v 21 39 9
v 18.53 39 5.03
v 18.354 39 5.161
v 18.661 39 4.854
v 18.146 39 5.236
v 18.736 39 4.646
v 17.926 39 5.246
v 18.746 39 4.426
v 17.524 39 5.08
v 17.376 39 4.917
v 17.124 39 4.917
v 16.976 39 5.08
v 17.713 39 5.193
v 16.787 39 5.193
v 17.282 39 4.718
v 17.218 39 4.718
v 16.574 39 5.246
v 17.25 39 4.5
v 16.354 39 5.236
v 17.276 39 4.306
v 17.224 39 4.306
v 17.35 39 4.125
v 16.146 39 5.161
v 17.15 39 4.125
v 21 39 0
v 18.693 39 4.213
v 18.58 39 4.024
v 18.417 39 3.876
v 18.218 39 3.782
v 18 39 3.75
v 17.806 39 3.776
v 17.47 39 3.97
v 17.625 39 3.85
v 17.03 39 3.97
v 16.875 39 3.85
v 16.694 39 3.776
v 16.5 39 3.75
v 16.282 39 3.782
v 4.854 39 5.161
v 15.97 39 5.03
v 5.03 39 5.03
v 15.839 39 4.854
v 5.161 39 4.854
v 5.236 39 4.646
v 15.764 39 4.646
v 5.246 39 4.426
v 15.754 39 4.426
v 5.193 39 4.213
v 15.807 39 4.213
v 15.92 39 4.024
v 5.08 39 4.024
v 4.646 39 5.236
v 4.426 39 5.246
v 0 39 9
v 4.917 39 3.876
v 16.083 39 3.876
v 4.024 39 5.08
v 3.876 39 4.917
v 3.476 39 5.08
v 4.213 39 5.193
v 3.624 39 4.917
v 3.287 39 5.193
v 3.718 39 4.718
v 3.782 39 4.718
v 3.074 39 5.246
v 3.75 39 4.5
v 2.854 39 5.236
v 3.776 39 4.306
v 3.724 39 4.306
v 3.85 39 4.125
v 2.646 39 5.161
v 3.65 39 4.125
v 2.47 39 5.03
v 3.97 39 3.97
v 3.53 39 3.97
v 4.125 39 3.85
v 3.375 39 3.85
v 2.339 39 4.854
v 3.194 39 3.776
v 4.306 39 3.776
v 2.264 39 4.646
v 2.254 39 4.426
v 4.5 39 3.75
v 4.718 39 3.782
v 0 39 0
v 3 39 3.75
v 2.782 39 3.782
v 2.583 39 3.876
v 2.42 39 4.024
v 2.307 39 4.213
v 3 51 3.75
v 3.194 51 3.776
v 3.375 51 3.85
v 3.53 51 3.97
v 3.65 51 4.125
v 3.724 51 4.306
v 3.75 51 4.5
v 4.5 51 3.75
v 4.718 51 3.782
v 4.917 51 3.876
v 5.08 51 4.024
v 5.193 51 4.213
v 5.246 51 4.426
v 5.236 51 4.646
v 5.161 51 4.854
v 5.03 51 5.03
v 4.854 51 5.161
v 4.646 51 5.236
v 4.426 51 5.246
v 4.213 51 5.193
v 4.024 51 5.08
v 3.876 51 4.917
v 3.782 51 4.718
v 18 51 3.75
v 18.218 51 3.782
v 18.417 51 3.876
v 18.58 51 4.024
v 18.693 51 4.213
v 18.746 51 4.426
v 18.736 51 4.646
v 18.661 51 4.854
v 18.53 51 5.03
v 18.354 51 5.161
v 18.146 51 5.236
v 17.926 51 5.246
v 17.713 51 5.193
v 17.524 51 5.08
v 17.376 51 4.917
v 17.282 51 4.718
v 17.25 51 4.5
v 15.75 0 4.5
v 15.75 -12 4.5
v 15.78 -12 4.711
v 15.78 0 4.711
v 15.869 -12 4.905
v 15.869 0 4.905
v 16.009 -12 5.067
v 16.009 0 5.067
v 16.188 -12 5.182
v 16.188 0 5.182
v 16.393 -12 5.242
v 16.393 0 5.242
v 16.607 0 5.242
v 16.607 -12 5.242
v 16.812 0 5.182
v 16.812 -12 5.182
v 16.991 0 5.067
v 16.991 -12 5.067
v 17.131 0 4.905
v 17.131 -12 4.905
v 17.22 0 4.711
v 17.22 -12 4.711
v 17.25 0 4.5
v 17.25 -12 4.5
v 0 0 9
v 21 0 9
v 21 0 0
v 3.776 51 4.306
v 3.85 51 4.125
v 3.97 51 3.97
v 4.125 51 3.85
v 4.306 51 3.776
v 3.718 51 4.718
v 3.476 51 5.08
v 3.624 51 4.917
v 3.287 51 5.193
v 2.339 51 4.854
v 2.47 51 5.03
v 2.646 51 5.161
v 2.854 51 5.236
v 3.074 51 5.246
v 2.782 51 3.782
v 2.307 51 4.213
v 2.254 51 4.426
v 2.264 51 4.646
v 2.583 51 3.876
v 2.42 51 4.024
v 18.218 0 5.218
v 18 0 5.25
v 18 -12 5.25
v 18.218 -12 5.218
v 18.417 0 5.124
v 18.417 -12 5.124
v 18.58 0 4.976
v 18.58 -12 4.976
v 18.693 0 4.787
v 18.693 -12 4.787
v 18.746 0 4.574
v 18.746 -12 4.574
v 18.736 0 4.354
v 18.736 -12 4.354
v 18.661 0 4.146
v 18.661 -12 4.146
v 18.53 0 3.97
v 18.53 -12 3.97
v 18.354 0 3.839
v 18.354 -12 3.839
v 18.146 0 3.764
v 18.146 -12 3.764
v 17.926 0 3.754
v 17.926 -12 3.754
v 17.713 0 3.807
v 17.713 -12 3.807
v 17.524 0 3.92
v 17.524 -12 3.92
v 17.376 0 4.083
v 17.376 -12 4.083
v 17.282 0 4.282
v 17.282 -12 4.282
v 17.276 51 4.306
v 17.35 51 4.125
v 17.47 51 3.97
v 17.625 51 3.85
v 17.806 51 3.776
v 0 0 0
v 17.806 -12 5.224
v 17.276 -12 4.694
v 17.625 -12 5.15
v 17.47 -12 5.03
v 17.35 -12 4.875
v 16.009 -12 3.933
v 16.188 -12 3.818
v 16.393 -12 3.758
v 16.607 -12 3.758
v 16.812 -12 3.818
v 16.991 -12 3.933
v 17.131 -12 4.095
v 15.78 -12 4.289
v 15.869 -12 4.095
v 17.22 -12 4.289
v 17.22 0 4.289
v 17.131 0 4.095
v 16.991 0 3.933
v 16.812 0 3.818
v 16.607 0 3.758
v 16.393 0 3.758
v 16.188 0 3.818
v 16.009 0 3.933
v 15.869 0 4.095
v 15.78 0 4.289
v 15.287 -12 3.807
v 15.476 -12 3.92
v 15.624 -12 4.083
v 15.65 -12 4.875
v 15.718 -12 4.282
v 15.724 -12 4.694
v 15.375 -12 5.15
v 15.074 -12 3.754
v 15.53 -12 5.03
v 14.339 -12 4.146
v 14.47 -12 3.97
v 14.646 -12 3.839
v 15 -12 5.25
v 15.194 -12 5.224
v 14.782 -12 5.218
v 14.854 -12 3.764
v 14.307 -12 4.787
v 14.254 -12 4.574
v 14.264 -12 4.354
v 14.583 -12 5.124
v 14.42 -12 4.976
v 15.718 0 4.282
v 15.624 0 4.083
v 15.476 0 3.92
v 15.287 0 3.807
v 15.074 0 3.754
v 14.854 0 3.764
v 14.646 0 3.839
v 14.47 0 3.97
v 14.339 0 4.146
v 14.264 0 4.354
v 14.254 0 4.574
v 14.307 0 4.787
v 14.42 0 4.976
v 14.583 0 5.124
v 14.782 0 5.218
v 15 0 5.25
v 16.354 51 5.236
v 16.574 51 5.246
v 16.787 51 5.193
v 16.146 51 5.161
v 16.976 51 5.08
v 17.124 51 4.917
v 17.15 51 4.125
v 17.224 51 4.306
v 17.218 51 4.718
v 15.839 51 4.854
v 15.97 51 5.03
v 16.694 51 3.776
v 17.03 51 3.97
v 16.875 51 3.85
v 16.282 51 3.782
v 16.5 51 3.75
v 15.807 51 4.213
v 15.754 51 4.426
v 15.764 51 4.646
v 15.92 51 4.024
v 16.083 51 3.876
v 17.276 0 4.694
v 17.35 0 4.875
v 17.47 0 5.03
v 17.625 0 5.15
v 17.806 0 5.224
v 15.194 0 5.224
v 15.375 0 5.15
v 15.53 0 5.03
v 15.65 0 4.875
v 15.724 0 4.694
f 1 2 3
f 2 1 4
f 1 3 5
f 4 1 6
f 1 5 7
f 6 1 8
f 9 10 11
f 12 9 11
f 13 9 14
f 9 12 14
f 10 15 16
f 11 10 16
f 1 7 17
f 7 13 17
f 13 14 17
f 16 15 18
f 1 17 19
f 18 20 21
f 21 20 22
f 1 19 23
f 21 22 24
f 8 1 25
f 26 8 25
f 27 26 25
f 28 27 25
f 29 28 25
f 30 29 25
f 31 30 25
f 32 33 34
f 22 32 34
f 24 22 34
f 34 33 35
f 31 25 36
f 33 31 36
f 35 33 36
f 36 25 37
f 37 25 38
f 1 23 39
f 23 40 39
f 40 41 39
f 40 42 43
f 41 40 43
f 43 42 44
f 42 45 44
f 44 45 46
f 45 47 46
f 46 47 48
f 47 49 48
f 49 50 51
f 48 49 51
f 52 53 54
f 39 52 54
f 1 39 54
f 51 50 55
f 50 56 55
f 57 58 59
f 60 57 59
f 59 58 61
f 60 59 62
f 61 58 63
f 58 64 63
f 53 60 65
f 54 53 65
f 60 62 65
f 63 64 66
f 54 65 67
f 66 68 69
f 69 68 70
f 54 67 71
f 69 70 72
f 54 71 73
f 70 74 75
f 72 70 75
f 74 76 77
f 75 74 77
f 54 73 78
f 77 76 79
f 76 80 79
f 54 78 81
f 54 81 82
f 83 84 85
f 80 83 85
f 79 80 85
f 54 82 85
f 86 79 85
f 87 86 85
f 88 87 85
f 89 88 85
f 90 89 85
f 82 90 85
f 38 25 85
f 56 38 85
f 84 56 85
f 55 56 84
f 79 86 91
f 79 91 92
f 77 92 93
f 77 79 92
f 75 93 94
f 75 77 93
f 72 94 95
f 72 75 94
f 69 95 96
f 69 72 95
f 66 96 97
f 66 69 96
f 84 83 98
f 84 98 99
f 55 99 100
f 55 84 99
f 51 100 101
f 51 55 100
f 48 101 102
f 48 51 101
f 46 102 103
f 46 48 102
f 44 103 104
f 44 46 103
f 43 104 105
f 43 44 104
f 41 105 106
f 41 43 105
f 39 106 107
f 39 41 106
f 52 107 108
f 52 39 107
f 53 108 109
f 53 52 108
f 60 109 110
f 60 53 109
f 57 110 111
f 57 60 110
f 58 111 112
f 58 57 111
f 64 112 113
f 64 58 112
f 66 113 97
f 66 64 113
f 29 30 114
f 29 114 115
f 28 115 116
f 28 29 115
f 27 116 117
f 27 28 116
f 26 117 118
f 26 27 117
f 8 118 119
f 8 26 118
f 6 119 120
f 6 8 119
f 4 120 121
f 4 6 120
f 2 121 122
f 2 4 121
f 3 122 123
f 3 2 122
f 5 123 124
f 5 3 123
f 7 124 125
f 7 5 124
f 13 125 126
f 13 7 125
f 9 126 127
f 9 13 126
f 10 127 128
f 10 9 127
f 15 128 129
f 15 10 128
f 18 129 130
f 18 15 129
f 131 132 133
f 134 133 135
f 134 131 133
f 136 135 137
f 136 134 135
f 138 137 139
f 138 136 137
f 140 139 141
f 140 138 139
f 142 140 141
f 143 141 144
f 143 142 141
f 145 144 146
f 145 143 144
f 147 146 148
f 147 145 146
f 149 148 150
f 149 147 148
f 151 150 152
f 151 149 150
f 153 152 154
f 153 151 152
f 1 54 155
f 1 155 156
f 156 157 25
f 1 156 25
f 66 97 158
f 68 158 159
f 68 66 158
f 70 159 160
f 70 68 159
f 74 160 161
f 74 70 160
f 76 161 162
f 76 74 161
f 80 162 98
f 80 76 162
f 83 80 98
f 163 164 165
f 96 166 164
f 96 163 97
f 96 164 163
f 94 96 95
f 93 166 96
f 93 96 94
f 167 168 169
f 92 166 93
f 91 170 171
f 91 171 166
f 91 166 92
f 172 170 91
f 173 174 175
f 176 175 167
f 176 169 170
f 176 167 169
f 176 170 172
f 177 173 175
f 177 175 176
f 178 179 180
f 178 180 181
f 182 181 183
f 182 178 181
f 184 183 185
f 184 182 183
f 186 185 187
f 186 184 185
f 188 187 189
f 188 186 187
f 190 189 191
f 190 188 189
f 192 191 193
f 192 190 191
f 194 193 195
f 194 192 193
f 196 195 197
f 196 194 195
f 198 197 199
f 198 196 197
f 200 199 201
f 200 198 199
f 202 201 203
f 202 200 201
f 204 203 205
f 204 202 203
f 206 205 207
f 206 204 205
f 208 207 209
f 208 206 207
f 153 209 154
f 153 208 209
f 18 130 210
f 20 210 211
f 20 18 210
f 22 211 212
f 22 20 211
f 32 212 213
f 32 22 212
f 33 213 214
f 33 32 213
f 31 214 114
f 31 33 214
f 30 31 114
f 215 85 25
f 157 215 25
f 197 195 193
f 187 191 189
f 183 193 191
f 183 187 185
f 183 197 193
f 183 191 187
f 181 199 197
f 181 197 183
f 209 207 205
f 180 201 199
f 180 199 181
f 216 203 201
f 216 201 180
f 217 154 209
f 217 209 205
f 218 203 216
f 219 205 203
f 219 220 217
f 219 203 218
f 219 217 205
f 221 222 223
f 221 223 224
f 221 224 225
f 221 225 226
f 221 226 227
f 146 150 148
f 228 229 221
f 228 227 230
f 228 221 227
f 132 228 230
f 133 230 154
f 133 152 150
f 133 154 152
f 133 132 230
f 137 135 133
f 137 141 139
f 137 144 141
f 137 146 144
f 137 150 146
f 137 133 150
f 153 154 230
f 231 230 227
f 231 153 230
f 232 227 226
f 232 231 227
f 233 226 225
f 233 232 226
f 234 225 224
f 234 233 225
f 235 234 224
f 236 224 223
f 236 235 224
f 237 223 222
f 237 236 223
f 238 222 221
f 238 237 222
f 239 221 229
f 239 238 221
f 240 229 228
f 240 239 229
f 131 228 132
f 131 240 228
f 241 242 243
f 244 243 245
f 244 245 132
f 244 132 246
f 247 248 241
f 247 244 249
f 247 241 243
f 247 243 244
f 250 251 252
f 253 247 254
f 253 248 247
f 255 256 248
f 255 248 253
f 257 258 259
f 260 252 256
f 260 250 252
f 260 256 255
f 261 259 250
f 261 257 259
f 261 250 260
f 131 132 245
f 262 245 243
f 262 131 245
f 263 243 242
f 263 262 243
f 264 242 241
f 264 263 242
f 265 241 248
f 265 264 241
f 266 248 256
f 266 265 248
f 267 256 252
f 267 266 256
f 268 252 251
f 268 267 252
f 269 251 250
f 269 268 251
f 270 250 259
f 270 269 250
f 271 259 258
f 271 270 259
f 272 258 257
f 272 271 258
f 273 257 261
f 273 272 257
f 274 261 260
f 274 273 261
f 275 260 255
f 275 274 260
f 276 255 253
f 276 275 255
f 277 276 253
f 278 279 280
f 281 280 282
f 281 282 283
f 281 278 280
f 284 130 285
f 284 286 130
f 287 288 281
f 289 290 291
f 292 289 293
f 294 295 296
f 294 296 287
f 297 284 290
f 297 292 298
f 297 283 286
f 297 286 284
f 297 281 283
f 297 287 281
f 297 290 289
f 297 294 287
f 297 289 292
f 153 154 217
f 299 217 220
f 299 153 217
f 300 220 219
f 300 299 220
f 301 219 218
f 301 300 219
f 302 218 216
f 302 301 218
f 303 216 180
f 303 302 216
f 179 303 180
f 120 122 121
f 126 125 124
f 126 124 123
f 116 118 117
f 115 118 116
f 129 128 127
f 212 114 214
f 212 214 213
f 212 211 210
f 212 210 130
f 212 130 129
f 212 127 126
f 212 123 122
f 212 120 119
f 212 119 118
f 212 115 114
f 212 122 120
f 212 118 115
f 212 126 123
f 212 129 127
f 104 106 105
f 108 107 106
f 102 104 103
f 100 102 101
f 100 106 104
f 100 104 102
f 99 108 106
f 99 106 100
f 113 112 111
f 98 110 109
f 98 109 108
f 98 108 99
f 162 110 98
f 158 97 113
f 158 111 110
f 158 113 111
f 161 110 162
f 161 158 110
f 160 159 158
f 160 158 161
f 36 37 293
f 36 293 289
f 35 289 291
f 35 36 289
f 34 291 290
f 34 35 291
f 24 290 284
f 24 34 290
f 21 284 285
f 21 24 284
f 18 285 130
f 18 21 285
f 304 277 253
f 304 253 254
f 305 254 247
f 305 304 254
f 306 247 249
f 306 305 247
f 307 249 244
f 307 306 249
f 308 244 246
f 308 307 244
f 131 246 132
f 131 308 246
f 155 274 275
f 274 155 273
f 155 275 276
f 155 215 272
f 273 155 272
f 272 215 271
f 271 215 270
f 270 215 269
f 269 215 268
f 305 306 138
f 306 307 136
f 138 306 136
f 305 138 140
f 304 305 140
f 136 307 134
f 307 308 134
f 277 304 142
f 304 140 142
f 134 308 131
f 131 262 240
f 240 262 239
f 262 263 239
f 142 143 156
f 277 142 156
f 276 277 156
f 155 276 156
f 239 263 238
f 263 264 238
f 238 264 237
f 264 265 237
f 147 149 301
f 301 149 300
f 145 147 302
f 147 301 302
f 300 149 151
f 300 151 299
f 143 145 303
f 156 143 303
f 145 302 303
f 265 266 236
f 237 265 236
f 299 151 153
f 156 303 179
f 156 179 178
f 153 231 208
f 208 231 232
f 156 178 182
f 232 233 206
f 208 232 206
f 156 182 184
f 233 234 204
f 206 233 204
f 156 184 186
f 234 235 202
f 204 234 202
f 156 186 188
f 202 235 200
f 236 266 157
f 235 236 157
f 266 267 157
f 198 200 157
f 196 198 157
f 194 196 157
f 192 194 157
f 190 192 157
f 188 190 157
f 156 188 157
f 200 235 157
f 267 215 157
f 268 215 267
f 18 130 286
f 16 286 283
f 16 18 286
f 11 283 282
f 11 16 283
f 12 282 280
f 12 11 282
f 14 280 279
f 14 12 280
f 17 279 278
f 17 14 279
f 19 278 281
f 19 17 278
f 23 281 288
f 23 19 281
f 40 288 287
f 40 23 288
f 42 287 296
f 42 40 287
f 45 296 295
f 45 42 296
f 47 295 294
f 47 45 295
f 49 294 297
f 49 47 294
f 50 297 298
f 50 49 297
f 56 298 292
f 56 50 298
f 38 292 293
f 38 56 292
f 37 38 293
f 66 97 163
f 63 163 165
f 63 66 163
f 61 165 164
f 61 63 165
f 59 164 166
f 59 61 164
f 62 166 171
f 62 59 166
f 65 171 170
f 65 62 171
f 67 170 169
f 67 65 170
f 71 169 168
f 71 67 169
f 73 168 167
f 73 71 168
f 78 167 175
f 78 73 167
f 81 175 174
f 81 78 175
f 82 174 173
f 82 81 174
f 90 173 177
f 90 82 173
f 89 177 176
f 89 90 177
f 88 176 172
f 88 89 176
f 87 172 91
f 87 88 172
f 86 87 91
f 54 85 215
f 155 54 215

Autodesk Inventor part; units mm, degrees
ref_plane "YZ Plane" through (0, 0, 0) normal (1, 0, 0) x (0, 1, 0)
ref_plane "XZ Plane" through (0, 0, 0) normal (0, 1, 0) x (-1, 0, 0)
ref_plane "XY Plane" through (0, 0, 0) normal (0, 0, 1) x (1, 0, 0)
sketch "Sketch1" plane through (0, 0, 0) normal (0, 0, 1) x (1, 0, 0)
  line L0 (0, 0) -> (21, 0)
  line L1 (21, 0) -> (21, 39)
  line L2 (21, 39) -> (0, 39)
  line L3 (0, 39) -> (0, 0)
  dimension "d0" = 21
  dimension "d1" = 39
extrude "Extrusion1" add sketch "Sketch1" along normal blind 9
sketch "Sketch2" plane through (21, 39, 0) normal (0, 1, 0) x (0, 0, -1)
  line L0 (0, 0) -> (-9, 0) projected
  circle A0 centre (-4.5, 3) radius 0.75
  circle A1 centre (-4.5, 4.5) radius 0.75
  circle A2 centre (-4.5, 16.5) radius 0.75
  circle A3 centre (-4.5, 18) radius 0.75
  line L1 (0, 21) -> (-9, 21) projected
  point P0 (-4.5, 0)
  point P1 (-4.5, 0)
  point P2 (-4.5, 0)
  point P3 (-4.5, 17.25)
  point P4 (-4.5, 3.75)
  dimension "d14" = 1.5
  dimension "d15" = 1.5
  dimension "d16" = 1.5
  dimension "d17" = 3
  dimension "d18" = 3
extrude "Extrusion2" add sketch "Sketch2" along normal blind 12
sketch "Sketch3" plane through (0, 0, 0) normal (0, -1, 0) x (0, 0, 1)
  circle A0 centre (4.5, -18) radius 0.75
  circle A1 centre (4.5, -16.5) radius 0.75
  circle A2 centre (4.5, -15) radius 0.75
  line L0 (0, -21) -> (9, -21) projected
  point P0 (4.5, -21)
  point P1 (4.5, -15.75)
  point P2 (4.5, -17.25)
  dimension "d19" = 1.5
  dimension "d20" = 1.5
  dimension "d21" = 1.5
  dimension "d22" = 3
extrude "Extrusion3" add sketch "Sketch3" along normal blind 12
equation "\"d21\" = d20"
properties part number "Brushed ESC"
